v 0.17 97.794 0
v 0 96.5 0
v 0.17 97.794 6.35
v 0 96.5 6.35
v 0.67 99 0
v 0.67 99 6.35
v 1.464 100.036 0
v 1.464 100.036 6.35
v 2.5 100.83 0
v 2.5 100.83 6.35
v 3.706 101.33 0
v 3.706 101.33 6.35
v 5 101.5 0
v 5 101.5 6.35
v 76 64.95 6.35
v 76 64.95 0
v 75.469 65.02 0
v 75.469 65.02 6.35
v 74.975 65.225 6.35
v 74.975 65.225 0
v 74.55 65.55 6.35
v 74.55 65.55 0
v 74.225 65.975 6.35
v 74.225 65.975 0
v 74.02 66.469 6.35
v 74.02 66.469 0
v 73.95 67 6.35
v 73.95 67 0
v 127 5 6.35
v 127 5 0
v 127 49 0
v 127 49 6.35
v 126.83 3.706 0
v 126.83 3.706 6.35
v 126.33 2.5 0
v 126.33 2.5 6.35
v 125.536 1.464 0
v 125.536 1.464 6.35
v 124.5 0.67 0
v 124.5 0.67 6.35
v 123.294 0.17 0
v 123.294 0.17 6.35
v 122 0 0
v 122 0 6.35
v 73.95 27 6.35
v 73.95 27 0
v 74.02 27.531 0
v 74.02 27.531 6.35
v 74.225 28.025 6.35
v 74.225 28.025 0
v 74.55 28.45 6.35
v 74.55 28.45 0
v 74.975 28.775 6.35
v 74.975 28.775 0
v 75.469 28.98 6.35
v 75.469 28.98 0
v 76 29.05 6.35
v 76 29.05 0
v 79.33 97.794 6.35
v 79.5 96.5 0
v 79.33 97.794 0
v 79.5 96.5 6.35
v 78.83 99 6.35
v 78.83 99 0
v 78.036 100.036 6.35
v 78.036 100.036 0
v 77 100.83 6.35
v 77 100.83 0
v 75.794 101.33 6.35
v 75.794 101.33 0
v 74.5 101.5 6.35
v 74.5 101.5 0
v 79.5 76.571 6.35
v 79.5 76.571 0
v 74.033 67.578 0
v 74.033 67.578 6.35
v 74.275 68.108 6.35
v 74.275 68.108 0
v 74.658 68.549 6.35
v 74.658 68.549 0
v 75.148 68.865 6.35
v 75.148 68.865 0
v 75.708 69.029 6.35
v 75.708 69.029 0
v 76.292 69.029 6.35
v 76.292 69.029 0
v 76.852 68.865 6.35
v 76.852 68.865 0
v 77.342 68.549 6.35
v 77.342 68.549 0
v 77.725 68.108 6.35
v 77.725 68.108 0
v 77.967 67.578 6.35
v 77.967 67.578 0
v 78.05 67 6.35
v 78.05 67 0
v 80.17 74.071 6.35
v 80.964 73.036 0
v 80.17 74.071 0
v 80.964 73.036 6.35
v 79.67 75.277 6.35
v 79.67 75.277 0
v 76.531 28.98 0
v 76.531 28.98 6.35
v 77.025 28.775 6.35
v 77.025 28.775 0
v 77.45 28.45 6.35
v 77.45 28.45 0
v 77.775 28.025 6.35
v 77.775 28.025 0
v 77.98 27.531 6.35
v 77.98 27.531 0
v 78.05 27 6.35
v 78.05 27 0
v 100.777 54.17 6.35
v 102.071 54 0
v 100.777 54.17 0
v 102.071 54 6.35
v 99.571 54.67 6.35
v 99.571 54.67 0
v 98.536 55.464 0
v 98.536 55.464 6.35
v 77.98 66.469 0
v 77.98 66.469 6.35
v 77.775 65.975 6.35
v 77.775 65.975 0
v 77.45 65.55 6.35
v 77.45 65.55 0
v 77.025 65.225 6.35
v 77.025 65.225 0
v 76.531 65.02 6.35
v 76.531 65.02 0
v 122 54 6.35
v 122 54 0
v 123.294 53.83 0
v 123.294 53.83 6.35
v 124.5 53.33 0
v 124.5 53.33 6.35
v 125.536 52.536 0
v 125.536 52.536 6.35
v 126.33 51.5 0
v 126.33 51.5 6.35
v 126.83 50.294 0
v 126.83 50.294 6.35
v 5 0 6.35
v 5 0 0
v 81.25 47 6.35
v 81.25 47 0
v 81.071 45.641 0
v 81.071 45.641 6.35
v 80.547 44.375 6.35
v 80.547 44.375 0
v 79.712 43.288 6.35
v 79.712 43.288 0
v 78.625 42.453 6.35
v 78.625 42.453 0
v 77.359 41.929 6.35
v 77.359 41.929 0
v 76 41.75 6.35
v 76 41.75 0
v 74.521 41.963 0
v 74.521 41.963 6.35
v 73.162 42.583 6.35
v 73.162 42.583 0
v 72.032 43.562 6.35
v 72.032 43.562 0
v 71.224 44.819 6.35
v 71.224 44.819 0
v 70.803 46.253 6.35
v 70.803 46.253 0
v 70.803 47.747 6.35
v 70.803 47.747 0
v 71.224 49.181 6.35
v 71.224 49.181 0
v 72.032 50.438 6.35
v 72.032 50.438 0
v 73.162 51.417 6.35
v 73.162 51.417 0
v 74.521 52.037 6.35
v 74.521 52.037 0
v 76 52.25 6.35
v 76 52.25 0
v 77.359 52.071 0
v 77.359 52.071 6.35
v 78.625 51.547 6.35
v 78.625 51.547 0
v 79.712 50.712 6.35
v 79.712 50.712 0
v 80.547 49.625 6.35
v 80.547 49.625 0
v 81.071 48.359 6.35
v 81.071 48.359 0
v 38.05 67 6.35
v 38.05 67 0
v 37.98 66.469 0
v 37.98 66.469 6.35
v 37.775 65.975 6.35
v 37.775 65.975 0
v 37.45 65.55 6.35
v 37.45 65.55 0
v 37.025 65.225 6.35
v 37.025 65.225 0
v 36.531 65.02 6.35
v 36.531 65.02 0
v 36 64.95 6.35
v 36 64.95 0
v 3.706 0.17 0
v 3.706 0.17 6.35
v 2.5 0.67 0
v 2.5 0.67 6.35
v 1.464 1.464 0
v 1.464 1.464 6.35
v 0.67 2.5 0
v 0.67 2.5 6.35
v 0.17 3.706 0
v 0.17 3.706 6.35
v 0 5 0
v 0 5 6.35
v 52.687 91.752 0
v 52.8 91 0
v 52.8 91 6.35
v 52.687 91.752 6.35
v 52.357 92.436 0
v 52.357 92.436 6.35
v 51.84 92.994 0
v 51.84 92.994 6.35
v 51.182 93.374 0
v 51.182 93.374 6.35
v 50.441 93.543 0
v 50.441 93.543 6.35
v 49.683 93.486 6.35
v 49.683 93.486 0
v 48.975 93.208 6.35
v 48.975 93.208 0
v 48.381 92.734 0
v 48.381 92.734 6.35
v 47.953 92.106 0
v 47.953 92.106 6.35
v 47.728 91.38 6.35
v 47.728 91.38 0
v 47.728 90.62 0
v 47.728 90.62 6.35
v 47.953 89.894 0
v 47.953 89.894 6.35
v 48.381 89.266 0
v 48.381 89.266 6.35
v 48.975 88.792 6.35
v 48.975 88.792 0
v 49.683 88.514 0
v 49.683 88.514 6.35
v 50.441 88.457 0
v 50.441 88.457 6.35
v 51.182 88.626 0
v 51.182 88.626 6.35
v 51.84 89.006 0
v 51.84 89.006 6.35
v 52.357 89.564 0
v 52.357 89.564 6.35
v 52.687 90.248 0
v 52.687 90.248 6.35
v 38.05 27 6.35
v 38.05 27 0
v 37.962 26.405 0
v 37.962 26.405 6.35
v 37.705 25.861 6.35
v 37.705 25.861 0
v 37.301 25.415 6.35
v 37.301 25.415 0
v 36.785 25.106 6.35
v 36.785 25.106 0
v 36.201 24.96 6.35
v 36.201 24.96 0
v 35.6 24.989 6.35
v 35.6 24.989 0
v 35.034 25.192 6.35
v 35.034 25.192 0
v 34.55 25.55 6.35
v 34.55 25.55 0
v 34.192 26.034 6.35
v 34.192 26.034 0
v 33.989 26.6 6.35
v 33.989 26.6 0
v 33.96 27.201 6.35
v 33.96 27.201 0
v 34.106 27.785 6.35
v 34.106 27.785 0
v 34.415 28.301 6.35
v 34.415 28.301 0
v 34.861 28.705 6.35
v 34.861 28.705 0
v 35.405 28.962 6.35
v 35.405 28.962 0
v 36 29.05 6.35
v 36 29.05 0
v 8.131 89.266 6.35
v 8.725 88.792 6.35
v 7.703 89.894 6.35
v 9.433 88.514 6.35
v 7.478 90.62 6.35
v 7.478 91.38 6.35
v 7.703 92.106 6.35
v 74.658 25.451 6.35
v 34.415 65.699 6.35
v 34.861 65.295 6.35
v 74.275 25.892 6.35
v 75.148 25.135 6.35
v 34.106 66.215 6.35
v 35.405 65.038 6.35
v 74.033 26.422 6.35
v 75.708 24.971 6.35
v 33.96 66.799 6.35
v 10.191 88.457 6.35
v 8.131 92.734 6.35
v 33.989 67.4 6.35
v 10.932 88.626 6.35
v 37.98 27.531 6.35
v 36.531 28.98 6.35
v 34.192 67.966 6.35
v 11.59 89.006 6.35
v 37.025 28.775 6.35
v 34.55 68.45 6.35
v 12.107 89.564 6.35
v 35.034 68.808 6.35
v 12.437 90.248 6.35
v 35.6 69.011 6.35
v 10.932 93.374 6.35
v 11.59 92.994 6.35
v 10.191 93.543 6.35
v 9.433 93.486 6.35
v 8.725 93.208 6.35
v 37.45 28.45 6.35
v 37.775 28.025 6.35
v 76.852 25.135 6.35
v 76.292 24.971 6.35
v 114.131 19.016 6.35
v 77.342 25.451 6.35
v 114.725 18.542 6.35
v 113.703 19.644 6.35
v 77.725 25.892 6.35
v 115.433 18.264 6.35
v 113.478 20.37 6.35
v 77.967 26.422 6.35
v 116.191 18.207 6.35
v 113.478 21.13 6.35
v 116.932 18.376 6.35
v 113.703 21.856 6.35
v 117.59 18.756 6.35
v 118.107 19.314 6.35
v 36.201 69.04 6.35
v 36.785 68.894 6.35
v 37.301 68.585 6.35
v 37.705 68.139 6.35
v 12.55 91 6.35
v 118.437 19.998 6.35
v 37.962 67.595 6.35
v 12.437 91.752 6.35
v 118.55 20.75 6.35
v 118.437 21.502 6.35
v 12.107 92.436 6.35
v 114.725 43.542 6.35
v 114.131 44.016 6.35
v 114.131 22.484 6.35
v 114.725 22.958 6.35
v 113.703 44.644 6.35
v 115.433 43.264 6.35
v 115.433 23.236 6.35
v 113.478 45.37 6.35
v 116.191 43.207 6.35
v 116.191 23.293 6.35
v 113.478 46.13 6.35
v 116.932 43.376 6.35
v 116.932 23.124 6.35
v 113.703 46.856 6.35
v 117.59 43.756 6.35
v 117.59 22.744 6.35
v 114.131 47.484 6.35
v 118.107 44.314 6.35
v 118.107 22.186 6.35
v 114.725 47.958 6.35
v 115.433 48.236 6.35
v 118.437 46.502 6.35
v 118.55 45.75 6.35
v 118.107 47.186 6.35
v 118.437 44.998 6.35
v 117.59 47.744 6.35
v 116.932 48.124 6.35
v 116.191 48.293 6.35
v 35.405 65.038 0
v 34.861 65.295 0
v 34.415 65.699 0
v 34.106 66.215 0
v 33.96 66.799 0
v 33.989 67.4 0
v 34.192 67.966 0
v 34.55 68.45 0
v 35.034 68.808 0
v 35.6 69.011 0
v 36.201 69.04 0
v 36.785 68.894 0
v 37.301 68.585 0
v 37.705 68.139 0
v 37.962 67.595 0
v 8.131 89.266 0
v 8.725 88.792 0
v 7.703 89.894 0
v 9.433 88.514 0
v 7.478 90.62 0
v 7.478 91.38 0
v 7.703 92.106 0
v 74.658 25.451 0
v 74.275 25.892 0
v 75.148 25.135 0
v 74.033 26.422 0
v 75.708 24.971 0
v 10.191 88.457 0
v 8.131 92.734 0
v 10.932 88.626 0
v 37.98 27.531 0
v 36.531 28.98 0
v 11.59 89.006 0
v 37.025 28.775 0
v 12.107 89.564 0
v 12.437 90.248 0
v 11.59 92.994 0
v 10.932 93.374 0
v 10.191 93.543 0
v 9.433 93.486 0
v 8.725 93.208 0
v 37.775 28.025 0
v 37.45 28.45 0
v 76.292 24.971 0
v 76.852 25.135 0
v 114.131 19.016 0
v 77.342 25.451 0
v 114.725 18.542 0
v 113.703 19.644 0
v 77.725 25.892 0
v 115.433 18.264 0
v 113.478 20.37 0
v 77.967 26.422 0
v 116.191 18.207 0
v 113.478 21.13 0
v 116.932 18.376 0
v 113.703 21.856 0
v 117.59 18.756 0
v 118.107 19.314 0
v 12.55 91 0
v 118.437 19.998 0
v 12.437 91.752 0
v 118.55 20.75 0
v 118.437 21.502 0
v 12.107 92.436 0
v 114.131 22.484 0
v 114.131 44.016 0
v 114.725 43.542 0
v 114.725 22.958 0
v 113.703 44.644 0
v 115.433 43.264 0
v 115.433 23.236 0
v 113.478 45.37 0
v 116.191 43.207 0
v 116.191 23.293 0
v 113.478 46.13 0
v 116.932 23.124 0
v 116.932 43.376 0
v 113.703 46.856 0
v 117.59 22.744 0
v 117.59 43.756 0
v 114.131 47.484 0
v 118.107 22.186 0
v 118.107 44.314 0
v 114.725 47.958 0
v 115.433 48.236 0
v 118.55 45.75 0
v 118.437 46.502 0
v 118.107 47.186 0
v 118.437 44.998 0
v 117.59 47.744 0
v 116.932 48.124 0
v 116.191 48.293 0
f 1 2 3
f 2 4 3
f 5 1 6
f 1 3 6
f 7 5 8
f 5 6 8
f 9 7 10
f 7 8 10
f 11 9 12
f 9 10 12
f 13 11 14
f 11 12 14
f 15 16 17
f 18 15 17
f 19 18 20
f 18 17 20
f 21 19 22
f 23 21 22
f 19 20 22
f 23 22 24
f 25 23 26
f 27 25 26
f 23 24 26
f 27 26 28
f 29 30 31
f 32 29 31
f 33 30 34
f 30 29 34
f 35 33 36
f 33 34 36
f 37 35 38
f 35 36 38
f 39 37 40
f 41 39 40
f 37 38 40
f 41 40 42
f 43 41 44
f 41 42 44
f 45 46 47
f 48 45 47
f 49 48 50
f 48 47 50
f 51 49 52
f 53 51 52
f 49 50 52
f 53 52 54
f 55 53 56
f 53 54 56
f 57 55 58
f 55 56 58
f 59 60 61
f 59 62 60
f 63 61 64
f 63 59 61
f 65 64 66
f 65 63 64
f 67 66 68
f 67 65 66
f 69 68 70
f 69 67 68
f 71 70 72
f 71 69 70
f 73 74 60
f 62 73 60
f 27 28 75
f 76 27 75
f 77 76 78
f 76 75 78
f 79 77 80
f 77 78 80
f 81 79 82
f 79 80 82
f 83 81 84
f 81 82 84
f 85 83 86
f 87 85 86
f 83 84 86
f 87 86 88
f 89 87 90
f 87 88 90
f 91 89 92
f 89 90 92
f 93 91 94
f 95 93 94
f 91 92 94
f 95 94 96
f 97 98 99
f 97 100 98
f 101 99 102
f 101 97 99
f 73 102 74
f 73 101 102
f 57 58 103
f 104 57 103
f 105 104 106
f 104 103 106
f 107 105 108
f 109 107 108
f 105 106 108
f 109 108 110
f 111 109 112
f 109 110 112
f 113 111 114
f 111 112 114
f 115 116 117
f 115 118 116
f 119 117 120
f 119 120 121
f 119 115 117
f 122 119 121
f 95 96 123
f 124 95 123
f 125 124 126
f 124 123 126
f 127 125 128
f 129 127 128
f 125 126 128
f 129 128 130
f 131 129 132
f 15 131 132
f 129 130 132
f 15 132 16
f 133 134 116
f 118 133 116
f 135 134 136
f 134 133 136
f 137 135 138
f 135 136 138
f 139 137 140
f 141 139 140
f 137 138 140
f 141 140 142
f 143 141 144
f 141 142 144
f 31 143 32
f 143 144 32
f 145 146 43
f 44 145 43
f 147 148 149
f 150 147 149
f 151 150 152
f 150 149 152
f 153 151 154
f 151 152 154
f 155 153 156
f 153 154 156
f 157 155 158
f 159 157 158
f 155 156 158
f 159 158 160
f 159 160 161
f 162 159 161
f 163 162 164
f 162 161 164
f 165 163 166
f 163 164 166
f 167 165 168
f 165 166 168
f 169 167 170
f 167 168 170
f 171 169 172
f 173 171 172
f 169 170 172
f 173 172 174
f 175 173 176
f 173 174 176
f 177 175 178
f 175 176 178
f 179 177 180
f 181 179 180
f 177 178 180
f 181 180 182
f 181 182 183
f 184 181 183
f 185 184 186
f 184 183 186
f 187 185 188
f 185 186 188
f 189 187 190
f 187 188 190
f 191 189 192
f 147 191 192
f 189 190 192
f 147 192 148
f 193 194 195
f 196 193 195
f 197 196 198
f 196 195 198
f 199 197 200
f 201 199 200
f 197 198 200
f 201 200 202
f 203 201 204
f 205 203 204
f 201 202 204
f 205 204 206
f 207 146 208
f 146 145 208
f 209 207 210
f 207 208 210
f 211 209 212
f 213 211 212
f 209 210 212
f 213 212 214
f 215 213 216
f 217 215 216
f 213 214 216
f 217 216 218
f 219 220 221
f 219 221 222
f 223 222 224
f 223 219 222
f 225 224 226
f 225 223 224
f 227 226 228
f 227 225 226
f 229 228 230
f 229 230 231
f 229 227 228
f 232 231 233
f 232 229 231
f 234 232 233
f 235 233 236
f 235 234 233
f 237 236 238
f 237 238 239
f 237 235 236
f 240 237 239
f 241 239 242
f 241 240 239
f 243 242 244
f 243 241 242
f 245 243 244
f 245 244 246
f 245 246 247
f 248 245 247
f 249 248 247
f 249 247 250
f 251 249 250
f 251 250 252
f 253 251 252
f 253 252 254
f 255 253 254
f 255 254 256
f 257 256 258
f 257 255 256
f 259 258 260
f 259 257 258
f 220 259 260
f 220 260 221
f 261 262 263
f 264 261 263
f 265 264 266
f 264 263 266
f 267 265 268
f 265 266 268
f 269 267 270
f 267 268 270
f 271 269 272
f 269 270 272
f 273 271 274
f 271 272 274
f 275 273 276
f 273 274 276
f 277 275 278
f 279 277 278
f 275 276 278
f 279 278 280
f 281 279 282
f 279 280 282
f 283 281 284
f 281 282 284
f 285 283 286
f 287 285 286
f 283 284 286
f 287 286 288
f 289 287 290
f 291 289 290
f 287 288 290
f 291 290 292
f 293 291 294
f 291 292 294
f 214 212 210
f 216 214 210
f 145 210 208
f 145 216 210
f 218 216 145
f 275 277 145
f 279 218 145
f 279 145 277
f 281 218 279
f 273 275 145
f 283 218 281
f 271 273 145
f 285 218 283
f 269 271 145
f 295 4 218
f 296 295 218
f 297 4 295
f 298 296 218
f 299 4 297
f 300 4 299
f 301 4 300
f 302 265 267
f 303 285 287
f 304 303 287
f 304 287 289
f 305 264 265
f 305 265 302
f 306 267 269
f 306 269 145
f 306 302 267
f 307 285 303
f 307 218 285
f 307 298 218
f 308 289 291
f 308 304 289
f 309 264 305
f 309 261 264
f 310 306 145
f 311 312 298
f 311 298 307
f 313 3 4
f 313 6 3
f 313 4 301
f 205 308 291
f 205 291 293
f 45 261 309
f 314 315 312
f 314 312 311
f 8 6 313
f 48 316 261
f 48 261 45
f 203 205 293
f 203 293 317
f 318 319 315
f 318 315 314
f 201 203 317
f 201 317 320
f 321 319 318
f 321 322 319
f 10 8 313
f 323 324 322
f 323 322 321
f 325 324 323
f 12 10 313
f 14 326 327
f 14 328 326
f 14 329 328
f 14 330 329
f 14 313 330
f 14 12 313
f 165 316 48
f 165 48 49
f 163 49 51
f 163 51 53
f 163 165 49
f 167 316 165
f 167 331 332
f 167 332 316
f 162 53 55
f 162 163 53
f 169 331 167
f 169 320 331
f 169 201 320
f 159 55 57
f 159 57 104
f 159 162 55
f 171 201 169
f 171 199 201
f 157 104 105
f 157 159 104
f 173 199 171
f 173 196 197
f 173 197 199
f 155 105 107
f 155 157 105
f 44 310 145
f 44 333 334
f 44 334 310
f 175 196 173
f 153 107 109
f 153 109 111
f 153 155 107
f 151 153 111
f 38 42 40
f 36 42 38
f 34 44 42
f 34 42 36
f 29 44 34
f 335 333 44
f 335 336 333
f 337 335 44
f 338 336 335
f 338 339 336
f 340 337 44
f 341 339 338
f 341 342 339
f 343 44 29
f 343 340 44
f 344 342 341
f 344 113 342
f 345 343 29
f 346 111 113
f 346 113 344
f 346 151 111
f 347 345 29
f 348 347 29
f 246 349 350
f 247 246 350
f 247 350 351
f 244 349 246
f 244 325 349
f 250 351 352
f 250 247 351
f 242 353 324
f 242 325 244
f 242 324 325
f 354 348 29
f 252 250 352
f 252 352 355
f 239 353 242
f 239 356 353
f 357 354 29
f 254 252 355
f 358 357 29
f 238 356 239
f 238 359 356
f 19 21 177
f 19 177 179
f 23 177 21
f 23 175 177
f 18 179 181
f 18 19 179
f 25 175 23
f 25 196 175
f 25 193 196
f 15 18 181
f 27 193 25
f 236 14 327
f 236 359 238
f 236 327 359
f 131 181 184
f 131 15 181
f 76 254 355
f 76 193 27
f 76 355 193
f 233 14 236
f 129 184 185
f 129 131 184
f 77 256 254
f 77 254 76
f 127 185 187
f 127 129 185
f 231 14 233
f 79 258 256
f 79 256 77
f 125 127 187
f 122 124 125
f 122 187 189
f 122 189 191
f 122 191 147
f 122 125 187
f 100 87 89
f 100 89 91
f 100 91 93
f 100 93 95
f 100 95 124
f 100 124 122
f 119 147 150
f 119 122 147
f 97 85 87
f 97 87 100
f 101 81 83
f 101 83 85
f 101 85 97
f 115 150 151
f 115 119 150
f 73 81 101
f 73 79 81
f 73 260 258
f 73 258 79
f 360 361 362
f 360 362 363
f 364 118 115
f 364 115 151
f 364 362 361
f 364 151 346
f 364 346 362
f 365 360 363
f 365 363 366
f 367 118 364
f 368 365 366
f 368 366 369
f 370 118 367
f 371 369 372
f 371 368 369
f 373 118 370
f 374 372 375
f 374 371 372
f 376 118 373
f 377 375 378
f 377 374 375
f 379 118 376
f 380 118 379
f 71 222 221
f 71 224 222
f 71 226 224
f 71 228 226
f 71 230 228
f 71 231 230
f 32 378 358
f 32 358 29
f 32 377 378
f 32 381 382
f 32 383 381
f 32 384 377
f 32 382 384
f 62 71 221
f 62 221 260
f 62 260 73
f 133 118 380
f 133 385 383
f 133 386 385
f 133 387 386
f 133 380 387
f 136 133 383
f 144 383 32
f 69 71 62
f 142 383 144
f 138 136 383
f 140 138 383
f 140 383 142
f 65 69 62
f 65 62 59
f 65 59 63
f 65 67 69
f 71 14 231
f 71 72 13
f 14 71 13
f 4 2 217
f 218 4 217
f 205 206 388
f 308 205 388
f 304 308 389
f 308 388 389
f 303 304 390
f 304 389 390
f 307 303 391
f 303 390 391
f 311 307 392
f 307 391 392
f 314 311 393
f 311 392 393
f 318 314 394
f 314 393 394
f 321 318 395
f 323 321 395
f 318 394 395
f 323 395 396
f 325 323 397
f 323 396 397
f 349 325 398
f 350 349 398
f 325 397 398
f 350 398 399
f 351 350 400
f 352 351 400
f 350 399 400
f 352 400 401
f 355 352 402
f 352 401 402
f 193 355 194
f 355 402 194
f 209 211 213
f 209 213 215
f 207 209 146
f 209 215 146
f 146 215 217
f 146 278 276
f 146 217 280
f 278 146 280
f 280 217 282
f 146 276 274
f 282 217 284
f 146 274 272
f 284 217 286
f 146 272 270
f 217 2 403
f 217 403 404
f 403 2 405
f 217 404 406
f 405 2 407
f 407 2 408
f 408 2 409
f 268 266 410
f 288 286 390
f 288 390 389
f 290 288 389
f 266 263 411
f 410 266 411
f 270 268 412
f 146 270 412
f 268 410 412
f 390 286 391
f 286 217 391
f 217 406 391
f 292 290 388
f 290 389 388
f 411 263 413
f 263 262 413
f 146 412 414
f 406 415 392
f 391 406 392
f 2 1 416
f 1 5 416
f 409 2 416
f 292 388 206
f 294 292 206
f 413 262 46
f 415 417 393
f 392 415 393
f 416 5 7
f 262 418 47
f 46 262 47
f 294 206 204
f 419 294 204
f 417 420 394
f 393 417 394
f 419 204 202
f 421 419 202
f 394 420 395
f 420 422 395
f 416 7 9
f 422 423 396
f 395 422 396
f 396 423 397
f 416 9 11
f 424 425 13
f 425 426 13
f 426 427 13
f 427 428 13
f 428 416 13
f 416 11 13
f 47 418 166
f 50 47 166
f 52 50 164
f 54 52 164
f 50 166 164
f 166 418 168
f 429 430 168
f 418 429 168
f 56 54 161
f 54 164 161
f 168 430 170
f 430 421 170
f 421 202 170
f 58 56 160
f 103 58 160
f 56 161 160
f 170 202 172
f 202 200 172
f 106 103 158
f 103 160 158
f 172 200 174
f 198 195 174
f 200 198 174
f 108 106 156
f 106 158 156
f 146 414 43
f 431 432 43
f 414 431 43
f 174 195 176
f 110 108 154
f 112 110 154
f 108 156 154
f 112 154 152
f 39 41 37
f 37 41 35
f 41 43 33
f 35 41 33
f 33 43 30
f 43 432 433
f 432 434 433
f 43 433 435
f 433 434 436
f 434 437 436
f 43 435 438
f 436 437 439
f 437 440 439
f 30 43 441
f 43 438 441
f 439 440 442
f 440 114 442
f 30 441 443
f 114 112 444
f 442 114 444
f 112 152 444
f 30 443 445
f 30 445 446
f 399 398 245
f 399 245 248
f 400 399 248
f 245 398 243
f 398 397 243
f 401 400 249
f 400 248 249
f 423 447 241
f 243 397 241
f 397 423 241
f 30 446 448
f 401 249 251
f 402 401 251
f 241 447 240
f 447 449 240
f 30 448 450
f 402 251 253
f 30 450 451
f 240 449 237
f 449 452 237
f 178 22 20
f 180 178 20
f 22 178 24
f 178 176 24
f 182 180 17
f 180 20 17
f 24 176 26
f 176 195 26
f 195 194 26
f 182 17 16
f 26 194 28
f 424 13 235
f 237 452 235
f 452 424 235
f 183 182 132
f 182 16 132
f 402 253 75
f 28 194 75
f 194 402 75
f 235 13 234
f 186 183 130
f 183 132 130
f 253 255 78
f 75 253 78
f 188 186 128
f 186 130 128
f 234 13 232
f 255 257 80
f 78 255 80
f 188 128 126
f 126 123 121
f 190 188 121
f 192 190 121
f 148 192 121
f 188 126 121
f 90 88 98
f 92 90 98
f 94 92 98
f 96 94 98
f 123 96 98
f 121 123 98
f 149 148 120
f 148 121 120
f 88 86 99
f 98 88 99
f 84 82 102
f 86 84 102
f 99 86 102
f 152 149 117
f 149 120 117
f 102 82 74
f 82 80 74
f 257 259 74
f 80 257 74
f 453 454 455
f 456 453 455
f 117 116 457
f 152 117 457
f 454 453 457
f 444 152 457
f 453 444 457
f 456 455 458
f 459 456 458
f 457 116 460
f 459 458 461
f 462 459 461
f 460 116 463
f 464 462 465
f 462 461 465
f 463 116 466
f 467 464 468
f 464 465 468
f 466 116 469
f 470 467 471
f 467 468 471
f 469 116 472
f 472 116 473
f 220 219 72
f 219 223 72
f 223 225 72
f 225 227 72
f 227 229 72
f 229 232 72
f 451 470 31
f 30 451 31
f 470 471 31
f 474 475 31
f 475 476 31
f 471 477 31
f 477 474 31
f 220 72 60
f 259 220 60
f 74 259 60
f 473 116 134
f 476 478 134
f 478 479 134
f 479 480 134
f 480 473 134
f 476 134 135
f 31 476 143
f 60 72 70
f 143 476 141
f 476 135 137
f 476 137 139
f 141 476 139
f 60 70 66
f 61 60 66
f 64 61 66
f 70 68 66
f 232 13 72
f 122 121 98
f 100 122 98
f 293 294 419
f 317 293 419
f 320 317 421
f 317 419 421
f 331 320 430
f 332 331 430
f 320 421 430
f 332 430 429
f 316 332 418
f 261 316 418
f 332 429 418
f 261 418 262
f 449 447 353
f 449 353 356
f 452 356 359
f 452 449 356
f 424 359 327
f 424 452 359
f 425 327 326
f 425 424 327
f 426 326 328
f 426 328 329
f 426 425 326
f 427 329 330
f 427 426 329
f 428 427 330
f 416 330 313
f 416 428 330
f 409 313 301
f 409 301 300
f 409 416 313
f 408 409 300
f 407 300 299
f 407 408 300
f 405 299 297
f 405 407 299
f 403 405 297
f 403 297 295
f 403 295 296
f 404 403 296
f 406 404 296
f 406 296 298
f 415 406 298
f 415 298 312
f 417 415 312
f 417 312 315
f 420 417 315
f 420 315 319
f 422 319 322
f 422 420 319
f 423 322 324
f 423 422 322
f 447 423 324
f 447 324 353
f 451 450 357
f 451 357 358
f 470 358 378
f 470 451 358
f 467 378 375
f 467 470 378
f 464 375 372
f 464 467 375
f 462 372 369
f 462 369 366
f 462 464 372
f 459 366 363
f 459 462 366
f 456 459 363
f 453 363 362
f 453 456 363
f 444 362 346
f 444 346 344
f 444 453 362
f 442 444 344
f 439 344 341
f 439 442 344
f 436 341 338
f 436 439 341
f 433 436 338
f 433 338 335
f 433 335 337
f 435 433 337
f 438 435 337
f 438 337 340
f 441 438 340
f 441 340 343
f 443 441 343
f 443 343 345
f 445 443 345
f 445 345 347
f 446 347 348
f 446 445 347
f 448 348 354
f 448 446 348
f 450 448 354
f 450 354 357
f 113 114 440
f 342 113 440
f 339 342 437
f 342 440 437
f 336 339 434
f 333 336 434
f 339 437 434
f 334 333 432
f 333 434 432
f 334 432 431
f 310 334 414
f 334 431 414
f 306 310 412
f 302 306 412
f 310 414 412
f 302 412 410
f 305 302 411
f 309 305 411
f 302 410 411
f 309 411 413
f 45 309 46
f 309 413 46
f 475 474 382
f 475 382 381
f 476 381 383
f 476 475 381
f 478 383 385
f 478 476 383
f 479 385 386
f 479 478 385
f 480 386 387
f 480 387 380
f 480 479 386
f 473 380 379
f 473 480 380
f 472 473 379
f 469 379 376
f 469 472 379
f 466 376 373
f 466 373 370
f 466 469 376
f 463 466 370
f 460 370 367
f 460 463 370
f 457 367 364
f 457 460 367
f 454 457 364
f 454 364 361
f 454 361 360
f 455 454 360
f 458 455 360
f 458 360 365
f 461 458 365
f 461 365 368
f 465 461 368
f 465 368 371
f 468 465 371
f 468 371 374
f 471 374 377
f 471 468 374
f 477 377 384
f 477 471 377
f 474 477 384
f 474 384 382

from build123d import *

# Parameters (mm, degrees)
F0_R     = 2.55
F1_DEPTH = 6.35
F2_R     = 5
F3_R     = 5


with BuildPart() as f1:
    # F0 (on Top) → F1 (new body)
    with BuildSketch(Plane.XY):
        Polygon((0, 101.5), (0, 0), (127, 0), (127, 54), (100, 54), (79.5, 74.5), (79.5, 101.5), align=None)
        with BuildLine():
            ThreePointArc((36, 64.95), (34.5504310986, 68.4495689014), (38.05, 67))
            Line((38.05, 67), (73.95, 67))
            ThreePointArc((73.95, 67), (76, 69.05), (78.05, 67))
            ThreePointArc((78.05, 67), (77.4495689014, 65.5504310986), (76, 64.95))
            Line((76, 64.95), (76, 52.25))
            ThreePointArc((76, 52.25), (79.7123106012, 50.7123106012), (81.25, 47))
            ThreePointArc((81.25, 47), (79.7123106012, 43.2876893988), (76, 41.75))
            Line((76, 41.75), (76, 29.05))
            ThreePointArc((76, 29.05), (77.4495689014, 28.4495689014), (78.05, 27))
            ThreePointArc((78.05, 27), (76, 24.95), (73.95, 27))
            Line((73.95, 27), (38.05, 27))
            ThreePointArc((38.05, 27), (34.5504310986, 25.5504310986), (36, 29.05))
            Line((36, 29.05), (36, 64.95))
        make_face(mode=Mode.SUBTRACT)
        with Locations((116, 20.75)):
            Circle(F0_R, mode=Mode.SUBTRACT)
        with Locations((116, 45.75)):
            Circle(F0_R, mode=Mode.SUBTRACT)
        with Locations((10, 91)):
            Circle(F0_R, mode=Mode.SUBTRACT)
        with Locations((50.25, 91)):
            Circle(F0_R, mode=Mode.SUBTRACT)
        with BuildLine():
            Line((73.95, 67), (38.05, 67))
            ThreePointArc((38.05, 67), (37.4495689014, 65.5504310986), (36, 64.95))
            Line((36, 64.95), (36, 29.05))
            ThreePointArc((36, 29.05), (37.4495689014, 28.4495689014), (38.05, 27))
            Line((38.05, 27), (73.95, 27))
            ThreePointArc((73.95, 27), (74.5504310986, 28.4495689014), (76, 29.05))
            Line((76, 29.05), (76, 41.75))
            ThreePointArc((76, 41.75), (70.75, 47), (76, 52.25))
            Line((76, 52.25), (76, 64.95))
            ThreePointArc((76, 64.95), (74.5504310986, 65.5504310986), (73.95, 67))
        make_face()
    extrude(amount=F1_DEPTH)

    # F2
    f2_edges = [f1.edges().sort_by_distance(p)[0] for p in [
        (79.5, 74.5, 3.175),
        (100, 54, 3.175),
    ]]
    fillet(f2_edges, radius=F2_R)

    # F3
    f3_edges = [f1.edges().sort_by_distance(p)[0] for p in [
        (0, 101.5, 3.175),
        (79.5, 101.5, 3.175),
        (127, 54, 3.175),
        (127, 0, 3.175),
        (0, 0, 3.175),
    ]]
    fillet(f3_edges, radius=F3_R)


solid = f1.part
